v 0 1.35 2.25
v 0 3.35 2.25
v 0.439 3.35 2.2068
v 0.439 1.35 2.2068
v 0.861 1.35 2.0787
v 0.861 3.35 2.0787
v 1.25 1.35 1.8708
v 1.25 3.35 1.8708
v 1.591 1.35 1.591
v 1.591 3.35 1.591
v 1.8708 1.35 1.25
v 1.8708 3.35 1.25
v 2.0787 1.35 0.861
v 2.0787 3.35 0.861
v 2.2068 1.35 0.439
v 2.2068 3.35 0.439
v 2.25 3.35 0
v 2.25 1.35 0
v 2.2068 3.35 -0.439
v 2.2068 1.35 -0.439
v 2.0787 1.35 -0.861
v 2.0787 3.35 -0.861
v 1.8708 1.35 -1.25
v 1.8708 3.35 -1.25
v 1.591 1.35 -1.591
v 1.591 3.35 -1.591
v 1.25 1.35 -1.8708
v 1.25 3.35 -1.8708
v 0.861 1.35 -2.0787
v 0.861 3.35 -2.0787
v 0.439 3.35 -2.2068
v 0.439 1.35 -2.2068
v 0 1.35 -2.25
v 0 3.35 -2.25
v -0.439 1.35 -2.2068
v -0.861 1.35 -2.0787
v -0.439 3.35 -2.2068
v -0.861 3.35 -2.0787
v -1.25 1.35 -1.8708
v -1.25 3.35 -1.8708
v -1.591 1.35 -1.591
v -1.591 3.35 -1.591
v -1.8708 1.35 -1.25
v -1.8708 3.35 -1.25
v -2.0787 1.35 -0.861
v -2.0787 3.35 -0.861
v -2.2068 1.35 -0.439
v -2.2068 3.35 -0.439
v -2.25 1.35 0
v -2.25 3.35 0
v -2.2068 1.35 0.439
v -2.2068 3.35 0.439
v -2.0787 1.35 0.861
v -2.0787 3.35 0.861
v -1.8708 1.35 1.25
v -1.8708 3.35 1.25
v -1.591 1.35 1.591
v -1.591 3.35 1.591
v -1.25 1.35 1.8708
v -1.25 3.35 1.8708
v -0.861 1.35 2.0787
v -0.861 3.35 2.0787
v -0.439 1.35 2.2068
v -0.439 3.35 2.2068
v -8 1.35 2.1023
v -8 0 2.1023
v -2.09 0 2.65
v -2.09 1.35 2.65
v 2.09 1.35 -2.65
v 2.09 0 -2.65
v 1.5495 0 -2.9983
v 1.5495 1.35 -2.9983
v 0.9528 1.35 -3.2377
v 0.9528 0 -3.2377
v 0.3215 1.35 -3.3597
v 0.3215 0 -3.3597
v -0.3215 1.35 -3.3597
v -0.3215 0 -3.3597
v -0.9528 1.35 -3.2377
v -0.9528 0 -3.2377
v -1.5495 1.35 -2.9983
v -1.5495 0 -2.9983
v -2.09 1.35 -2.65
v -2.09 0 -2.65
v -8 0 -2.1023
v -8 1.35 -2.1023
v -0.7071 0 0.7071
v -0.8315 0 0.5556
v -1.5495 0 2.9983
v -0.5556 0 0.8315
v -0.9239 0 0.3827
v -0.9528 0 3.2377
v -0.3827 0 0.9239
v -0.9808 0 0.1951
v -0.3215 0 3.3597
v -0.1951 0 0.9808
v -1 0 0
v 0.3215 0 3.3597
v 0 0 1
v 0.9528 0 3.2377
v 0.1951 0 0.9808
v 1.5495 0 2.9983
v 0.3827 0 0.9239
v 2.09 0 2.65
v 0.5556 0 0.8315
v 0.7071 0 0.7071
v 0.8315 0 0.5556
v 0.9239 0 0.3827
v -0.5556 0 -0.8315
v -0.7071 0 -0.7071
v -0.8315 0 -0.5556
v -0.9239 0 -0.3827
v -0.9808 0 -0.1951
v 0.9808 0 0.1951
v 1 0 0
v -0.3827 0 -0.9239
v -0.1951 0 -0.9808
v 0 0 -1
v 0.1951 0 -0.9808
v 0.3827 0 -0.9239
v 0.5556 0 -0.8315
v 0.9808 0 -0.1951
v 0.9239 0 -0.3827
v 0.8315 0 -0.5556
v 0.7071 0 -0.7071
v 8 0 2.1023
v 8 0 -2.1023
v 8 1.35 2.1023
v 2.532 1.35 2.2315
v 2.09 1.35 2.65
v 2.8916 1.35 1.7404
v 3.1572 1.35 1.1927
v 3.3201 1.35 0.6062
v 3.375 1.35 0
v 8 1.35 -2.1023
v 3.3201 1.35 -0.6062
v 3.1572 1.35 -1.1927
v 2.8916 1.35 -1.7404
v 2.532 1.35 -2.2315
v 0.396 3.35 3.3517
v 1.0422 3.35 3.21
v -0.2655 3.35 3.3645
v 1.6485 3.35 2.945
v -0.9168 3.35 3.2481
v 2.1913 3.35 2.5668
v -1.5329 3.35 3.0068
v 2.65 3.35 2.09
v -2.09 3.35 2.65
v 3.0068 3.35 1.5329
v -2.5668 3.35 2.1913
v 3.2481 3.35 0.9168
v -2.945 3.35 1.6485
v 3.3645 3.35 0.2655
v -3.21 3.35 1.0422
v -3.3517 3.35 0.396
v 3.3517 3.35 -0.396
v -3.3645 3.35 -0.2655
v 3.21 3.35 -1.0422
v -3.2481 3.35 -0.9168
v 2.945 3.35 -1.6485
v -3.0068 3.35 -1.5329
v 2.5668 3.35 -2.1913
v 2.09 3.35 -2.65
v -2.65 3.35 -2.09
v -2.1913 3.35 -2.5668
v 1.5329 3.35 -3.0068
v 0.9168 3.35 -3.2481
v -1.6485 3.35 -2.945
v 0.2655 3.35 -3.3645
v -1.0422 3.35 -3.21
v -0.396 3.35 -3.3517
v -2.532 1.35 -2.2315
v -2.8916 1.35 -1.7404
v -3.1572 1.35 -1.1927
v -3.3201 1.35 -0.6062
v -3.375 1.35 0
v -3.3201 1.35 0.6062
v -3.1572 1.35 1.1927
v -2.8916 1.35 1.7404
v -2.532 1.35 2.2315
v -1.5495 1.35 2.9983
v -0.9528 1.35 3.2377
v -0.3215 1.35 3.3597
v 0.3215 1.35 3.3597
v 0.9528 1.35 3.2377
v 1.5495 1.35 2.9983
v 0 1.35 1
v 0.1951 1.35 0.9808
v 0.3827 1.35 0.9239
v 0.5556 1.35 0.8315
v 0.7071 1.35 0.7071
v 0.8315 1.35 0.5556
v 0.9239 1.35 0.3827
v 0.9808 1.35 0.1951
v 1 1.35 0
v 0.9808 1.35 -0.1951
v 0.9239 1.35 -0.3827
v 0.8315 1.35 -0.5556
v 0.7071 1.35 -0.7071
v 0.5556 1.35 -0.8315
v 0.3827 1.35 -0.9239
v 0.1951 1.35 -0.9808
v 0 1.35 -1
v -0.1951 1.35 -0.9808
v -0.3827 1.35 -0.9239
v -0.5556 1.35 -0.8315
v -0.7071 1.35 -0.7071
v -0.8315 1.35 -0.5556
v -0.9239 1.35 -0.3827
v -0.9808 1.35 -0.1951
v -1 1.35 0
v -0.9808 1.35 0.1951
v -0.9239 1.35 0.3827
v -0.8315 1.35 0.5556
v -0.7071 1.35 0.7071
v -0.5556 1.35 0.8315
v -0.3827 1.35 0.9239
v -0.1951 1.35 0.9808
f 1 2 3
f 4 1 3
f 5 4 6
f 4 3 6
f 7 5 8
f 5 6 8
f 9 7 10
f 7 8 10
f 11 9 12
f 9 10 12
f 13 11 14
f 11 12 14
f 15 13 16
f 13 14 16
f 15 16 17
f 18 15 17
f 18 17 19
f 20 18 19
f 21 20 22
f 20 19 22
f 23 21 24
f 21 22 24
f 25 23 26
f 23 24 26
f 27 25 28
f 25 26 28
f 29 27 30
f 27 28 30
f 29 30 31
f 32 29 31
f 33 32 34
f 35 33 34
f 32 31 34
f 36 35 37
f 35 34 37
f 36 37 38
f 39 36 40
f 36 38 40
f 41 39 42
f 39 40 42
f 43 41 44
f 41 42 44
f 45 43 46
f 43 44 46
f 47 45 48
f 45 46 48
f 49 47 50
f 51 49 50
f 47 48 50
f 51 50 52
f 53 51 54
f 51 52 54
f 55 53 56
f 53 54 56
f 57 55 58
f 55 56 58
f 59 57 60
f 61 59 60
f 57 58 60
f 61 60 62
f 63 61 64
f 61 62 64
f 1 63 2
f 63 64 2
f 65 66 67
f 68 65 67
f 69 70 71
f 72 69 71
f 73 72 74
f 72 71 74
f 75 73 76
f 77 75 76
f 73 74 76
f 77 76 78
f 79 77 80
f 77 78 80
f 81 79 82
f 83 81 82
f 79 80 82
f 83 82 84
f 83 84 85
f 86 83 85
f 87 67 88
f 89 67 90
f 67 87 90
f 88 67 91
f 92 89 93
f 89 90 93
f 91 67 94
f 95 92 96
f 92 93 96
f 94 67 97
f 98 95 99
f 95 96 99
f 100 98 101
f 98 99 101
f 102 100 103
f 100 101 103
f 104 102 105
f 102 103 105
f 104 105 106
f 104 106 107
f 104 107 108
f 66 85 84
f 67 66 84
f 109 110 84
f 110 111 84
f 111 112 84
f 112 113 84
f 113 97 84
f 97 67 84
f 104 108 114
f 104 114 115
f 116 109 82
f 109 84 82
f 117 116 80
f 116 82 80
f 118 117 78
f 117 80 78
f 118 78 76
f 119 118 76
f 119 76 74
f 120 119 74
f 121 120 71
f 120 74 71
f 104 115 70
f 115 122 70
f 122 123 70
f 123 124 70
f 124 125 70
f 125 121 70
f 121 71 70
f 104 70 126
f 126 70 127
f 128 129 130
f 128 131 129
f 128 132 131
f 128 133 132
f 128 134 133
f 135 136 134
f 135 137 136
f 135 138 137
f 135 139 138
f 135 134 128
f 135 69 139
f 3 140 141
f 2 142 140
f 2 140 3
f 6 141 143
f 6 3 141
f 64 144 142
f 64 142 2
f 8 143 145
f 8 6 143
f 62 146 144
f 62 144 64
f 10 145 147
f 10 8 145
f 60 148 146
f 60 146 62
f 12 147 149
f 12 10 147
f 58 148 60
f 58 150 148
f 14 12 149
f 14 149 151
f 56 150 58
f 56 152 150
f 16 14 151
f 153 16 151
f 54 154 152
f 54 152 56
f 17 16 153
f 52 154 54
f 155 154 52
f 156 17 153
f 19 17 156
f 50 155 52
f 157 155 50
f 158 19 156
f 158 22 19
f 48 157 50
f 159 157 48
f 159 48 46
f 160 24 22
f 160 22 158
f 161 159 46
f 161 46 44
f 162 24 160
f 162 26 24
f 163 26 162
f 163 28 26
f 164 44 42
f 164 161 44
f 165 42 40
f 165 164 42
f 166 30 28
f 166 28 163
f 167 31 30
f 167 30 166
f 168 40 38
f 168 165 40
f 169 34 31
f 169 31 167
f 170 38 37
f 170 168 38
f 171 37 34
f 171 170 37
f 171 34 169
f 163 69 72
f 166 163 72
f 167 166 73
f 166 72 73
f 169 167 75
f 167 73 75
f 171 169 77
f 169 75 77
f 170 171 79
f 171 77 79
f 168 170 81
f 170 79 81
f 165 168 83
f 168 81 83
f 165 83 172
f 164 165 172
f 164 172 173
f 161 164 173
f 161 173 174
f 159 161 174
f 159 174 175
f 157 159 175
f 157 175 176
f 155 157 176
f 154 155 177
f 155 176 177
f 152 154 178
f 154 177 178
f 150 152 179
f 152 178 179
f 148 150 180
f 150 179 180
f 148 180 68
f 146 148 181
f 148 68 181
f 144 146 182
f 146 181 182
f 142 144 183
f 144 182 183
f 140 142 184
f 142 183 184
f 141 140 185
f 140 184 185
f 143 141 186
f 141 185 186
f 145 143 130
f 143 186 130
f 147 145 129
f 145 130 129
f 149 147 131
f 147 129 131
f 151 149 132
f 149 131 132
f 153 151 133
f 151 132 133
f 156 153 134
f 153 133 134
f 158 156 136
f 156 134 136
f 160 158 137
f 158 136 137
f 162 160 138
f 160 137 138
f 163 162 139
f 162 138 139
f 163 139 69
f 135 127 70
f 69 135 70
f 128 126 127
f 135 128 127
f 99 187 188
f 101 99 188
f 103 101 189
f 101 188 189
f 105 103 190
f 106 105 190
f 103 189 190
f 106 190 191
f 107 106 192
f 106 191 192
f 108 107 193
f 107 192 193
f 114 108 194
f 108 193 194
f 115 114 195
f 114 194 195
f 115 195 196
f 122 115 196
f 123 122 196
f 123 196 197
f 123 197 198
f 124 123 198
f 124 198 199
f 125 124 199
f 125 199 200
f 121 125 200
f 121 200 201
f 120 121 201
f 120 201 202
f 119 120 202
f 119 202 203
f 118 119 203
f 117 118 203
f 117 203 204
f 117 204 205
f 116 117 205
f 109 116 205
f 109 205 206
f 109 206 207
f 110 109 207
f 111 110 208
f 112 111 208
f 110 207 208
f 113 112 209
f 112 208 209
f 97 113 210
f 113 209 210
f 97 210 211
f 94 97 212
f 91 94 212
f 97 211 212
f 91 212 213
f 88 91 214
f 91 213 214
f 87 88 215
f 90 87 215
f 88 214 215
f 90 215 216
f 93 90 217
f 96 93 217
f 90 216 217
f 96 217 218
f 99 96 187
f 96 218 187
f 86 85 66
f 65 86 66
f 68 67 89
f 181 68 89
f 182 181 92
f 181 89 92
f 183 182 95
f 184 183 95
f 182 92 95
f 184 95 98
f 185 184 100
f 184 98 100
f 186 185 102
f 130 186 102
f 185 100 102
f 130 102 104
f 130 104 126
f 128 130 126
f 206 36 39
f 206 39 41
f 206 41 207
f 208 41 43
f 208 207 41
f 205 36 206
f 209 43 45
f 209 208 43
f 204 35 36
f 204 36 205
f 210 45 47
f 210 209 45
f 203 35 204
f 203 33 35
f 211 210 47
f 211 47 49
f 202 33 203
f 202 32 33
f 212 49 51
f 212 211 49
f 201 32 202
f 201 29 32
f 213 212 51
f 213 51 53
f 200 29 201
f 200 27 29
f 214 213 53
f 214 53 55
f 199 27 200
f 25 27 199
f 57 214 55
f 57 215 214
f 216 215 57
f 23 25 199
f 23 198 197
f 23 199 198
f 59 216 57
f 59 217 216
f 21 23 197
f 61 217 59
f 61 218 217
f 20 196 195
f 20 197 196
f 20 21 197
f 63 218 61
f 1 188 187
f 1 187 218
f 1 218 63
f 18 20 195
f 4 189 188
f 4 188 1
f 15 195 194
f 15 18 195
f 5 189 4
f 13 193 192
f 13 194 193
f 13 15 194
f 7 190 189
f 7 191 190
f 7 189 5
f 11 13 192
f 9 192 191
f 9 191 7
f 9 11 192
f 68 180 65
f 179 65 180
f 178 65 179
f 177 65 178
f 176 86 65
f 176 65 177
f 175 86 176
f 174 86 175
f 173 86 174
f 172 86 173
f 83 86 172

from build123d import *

# Parameters (mm, degrees)
ESTRUSIONE_ESTRUSIONE1_DEPTH = 1.35
SCHIZZO2_R                   = 3.375
ESTRUSIONE_ESTRUSIONE2_DEPTH = 2
SCHIZZO3_R                   = 2.25
TAGLIO_ESTRUSIONE1_DEPTH     = 2
SCHIZZO4_R                   = 1
TAGLIO_ESTRUSIONE2_DEPTH     = 9.910141694


with BuildPart() as part:
    # Schizzo1 → Estrusione-Estrusione1 (new body)
    with BuildSketch(Plane(origin=(0, 0, 0), x_dir=(1, 0, 0), z_dir=(0, 1, 0))):
        with BuildLine():
            Line((8, 2.102337115), (2.090005981, 2.65))
            ThreePointArc((2.090005981, 2.65), (3.036807138, 1.472558117), (3.375, 0))
            ThreePointArc((3.375, 0), (3.036807138, -1.472558117), (2.090005981, -2.65))
            Line((2.090005981, -2.65), (8, -2.102337115))
            Line((8, -2.102337115), (8, 2.102337115))
        make_face()
        with BuildLine():
            ThreePointArc((2.090005981, 2.65), (0, 3.375), (-2.090005981, 2.65))
            Line((-2.090005981, 2.65), (-2.090005981, -2.65))
            ThreePointArc((-2.090005981, -2.65), (0, -3.375), (2.090005981, -2.65))
            Line((2.090005981, -2.65), (2.090005981, 2.65))
        make_face()
        with BuildLine():
            ThreePointArc((-2.090005981, -2.65), (-3.375, 0), (-2.090005981, 2.65))
            Line((-2.090005981, 2.65), (-8, 2.102337115))
            Line((-8, 2.102337115), (-8, -2.102337115))
            Line((-8, -2.102337115), (-2.090005981, -2.65))
        make_face()
        with BuildLine():
            Line((-2.090005981, -2.65), (-2.090005981, 2.65))
            ThreePointArc((-2.090005981, 2.65), (-3.375, 0), (-2.090005981, -2.65))
        make_face()
        with BuildLine():
            ThreePointArc((3.375, 0), (3.036807138, 1.472558117), (2.090005981, 2.65))
            Line((2.090005981, 2.65), (2.090005981, -2.65))
            ThreePointArc((2.090005981, -2.65), (3.036807138, -1.472558117), (3.375, 0))
        make_face()
    extrude(amount=ESTRUSIONE_ESTRUSIONE1_DEPTH)

    # Schizzo2 → Estrusione-Estrusione2 (add)
    with BuildSketch(Plane(origin=(0, 1.35, 0), x_dir=(1, 0, 0), z_dir=(0, 1, 0))):
        with Locations(Location((0, 0, 0), (0, 0, 51.737808872))):
            Circle(SCHIZZO2_R)
    extrude(amount=ESTRUSIONE_ESTRUSIONE2_DEPTH)

    # Schizzo3 → Taglio-Estrusione1 (cut)
    with BuildSketch(Plane(origin=(0, 3.35, 0), x_dir=(1, 0, 0), z_dir=(0, 1, 0))):
        with Locations(Location((0, 0, 0), (0, 0, 270))):
            Circle(SCHIZZO3_R)
    extrude(amount=-TAGLIO_ESTRUSIONE1_DEPTH, mode=Mode.SUBTRACT)

    # Schizzo4 → Taglio-Estrusione2 (cut, through all)
    with BuildSketch(Plane(origin=(0, 1.35, 0), x_dir=(1, 0, 0), z_dir=(0, 1, 0))):
        with Locations(Location((0, 0, 0), (0, 0, 270))):
            Circle(SCHIZZO4_R)
    extrude(amount=-TAGLIO_ESTRUSIONE2_DEPTH, mode=Mode.SUBTRACT)


solid = part.part
